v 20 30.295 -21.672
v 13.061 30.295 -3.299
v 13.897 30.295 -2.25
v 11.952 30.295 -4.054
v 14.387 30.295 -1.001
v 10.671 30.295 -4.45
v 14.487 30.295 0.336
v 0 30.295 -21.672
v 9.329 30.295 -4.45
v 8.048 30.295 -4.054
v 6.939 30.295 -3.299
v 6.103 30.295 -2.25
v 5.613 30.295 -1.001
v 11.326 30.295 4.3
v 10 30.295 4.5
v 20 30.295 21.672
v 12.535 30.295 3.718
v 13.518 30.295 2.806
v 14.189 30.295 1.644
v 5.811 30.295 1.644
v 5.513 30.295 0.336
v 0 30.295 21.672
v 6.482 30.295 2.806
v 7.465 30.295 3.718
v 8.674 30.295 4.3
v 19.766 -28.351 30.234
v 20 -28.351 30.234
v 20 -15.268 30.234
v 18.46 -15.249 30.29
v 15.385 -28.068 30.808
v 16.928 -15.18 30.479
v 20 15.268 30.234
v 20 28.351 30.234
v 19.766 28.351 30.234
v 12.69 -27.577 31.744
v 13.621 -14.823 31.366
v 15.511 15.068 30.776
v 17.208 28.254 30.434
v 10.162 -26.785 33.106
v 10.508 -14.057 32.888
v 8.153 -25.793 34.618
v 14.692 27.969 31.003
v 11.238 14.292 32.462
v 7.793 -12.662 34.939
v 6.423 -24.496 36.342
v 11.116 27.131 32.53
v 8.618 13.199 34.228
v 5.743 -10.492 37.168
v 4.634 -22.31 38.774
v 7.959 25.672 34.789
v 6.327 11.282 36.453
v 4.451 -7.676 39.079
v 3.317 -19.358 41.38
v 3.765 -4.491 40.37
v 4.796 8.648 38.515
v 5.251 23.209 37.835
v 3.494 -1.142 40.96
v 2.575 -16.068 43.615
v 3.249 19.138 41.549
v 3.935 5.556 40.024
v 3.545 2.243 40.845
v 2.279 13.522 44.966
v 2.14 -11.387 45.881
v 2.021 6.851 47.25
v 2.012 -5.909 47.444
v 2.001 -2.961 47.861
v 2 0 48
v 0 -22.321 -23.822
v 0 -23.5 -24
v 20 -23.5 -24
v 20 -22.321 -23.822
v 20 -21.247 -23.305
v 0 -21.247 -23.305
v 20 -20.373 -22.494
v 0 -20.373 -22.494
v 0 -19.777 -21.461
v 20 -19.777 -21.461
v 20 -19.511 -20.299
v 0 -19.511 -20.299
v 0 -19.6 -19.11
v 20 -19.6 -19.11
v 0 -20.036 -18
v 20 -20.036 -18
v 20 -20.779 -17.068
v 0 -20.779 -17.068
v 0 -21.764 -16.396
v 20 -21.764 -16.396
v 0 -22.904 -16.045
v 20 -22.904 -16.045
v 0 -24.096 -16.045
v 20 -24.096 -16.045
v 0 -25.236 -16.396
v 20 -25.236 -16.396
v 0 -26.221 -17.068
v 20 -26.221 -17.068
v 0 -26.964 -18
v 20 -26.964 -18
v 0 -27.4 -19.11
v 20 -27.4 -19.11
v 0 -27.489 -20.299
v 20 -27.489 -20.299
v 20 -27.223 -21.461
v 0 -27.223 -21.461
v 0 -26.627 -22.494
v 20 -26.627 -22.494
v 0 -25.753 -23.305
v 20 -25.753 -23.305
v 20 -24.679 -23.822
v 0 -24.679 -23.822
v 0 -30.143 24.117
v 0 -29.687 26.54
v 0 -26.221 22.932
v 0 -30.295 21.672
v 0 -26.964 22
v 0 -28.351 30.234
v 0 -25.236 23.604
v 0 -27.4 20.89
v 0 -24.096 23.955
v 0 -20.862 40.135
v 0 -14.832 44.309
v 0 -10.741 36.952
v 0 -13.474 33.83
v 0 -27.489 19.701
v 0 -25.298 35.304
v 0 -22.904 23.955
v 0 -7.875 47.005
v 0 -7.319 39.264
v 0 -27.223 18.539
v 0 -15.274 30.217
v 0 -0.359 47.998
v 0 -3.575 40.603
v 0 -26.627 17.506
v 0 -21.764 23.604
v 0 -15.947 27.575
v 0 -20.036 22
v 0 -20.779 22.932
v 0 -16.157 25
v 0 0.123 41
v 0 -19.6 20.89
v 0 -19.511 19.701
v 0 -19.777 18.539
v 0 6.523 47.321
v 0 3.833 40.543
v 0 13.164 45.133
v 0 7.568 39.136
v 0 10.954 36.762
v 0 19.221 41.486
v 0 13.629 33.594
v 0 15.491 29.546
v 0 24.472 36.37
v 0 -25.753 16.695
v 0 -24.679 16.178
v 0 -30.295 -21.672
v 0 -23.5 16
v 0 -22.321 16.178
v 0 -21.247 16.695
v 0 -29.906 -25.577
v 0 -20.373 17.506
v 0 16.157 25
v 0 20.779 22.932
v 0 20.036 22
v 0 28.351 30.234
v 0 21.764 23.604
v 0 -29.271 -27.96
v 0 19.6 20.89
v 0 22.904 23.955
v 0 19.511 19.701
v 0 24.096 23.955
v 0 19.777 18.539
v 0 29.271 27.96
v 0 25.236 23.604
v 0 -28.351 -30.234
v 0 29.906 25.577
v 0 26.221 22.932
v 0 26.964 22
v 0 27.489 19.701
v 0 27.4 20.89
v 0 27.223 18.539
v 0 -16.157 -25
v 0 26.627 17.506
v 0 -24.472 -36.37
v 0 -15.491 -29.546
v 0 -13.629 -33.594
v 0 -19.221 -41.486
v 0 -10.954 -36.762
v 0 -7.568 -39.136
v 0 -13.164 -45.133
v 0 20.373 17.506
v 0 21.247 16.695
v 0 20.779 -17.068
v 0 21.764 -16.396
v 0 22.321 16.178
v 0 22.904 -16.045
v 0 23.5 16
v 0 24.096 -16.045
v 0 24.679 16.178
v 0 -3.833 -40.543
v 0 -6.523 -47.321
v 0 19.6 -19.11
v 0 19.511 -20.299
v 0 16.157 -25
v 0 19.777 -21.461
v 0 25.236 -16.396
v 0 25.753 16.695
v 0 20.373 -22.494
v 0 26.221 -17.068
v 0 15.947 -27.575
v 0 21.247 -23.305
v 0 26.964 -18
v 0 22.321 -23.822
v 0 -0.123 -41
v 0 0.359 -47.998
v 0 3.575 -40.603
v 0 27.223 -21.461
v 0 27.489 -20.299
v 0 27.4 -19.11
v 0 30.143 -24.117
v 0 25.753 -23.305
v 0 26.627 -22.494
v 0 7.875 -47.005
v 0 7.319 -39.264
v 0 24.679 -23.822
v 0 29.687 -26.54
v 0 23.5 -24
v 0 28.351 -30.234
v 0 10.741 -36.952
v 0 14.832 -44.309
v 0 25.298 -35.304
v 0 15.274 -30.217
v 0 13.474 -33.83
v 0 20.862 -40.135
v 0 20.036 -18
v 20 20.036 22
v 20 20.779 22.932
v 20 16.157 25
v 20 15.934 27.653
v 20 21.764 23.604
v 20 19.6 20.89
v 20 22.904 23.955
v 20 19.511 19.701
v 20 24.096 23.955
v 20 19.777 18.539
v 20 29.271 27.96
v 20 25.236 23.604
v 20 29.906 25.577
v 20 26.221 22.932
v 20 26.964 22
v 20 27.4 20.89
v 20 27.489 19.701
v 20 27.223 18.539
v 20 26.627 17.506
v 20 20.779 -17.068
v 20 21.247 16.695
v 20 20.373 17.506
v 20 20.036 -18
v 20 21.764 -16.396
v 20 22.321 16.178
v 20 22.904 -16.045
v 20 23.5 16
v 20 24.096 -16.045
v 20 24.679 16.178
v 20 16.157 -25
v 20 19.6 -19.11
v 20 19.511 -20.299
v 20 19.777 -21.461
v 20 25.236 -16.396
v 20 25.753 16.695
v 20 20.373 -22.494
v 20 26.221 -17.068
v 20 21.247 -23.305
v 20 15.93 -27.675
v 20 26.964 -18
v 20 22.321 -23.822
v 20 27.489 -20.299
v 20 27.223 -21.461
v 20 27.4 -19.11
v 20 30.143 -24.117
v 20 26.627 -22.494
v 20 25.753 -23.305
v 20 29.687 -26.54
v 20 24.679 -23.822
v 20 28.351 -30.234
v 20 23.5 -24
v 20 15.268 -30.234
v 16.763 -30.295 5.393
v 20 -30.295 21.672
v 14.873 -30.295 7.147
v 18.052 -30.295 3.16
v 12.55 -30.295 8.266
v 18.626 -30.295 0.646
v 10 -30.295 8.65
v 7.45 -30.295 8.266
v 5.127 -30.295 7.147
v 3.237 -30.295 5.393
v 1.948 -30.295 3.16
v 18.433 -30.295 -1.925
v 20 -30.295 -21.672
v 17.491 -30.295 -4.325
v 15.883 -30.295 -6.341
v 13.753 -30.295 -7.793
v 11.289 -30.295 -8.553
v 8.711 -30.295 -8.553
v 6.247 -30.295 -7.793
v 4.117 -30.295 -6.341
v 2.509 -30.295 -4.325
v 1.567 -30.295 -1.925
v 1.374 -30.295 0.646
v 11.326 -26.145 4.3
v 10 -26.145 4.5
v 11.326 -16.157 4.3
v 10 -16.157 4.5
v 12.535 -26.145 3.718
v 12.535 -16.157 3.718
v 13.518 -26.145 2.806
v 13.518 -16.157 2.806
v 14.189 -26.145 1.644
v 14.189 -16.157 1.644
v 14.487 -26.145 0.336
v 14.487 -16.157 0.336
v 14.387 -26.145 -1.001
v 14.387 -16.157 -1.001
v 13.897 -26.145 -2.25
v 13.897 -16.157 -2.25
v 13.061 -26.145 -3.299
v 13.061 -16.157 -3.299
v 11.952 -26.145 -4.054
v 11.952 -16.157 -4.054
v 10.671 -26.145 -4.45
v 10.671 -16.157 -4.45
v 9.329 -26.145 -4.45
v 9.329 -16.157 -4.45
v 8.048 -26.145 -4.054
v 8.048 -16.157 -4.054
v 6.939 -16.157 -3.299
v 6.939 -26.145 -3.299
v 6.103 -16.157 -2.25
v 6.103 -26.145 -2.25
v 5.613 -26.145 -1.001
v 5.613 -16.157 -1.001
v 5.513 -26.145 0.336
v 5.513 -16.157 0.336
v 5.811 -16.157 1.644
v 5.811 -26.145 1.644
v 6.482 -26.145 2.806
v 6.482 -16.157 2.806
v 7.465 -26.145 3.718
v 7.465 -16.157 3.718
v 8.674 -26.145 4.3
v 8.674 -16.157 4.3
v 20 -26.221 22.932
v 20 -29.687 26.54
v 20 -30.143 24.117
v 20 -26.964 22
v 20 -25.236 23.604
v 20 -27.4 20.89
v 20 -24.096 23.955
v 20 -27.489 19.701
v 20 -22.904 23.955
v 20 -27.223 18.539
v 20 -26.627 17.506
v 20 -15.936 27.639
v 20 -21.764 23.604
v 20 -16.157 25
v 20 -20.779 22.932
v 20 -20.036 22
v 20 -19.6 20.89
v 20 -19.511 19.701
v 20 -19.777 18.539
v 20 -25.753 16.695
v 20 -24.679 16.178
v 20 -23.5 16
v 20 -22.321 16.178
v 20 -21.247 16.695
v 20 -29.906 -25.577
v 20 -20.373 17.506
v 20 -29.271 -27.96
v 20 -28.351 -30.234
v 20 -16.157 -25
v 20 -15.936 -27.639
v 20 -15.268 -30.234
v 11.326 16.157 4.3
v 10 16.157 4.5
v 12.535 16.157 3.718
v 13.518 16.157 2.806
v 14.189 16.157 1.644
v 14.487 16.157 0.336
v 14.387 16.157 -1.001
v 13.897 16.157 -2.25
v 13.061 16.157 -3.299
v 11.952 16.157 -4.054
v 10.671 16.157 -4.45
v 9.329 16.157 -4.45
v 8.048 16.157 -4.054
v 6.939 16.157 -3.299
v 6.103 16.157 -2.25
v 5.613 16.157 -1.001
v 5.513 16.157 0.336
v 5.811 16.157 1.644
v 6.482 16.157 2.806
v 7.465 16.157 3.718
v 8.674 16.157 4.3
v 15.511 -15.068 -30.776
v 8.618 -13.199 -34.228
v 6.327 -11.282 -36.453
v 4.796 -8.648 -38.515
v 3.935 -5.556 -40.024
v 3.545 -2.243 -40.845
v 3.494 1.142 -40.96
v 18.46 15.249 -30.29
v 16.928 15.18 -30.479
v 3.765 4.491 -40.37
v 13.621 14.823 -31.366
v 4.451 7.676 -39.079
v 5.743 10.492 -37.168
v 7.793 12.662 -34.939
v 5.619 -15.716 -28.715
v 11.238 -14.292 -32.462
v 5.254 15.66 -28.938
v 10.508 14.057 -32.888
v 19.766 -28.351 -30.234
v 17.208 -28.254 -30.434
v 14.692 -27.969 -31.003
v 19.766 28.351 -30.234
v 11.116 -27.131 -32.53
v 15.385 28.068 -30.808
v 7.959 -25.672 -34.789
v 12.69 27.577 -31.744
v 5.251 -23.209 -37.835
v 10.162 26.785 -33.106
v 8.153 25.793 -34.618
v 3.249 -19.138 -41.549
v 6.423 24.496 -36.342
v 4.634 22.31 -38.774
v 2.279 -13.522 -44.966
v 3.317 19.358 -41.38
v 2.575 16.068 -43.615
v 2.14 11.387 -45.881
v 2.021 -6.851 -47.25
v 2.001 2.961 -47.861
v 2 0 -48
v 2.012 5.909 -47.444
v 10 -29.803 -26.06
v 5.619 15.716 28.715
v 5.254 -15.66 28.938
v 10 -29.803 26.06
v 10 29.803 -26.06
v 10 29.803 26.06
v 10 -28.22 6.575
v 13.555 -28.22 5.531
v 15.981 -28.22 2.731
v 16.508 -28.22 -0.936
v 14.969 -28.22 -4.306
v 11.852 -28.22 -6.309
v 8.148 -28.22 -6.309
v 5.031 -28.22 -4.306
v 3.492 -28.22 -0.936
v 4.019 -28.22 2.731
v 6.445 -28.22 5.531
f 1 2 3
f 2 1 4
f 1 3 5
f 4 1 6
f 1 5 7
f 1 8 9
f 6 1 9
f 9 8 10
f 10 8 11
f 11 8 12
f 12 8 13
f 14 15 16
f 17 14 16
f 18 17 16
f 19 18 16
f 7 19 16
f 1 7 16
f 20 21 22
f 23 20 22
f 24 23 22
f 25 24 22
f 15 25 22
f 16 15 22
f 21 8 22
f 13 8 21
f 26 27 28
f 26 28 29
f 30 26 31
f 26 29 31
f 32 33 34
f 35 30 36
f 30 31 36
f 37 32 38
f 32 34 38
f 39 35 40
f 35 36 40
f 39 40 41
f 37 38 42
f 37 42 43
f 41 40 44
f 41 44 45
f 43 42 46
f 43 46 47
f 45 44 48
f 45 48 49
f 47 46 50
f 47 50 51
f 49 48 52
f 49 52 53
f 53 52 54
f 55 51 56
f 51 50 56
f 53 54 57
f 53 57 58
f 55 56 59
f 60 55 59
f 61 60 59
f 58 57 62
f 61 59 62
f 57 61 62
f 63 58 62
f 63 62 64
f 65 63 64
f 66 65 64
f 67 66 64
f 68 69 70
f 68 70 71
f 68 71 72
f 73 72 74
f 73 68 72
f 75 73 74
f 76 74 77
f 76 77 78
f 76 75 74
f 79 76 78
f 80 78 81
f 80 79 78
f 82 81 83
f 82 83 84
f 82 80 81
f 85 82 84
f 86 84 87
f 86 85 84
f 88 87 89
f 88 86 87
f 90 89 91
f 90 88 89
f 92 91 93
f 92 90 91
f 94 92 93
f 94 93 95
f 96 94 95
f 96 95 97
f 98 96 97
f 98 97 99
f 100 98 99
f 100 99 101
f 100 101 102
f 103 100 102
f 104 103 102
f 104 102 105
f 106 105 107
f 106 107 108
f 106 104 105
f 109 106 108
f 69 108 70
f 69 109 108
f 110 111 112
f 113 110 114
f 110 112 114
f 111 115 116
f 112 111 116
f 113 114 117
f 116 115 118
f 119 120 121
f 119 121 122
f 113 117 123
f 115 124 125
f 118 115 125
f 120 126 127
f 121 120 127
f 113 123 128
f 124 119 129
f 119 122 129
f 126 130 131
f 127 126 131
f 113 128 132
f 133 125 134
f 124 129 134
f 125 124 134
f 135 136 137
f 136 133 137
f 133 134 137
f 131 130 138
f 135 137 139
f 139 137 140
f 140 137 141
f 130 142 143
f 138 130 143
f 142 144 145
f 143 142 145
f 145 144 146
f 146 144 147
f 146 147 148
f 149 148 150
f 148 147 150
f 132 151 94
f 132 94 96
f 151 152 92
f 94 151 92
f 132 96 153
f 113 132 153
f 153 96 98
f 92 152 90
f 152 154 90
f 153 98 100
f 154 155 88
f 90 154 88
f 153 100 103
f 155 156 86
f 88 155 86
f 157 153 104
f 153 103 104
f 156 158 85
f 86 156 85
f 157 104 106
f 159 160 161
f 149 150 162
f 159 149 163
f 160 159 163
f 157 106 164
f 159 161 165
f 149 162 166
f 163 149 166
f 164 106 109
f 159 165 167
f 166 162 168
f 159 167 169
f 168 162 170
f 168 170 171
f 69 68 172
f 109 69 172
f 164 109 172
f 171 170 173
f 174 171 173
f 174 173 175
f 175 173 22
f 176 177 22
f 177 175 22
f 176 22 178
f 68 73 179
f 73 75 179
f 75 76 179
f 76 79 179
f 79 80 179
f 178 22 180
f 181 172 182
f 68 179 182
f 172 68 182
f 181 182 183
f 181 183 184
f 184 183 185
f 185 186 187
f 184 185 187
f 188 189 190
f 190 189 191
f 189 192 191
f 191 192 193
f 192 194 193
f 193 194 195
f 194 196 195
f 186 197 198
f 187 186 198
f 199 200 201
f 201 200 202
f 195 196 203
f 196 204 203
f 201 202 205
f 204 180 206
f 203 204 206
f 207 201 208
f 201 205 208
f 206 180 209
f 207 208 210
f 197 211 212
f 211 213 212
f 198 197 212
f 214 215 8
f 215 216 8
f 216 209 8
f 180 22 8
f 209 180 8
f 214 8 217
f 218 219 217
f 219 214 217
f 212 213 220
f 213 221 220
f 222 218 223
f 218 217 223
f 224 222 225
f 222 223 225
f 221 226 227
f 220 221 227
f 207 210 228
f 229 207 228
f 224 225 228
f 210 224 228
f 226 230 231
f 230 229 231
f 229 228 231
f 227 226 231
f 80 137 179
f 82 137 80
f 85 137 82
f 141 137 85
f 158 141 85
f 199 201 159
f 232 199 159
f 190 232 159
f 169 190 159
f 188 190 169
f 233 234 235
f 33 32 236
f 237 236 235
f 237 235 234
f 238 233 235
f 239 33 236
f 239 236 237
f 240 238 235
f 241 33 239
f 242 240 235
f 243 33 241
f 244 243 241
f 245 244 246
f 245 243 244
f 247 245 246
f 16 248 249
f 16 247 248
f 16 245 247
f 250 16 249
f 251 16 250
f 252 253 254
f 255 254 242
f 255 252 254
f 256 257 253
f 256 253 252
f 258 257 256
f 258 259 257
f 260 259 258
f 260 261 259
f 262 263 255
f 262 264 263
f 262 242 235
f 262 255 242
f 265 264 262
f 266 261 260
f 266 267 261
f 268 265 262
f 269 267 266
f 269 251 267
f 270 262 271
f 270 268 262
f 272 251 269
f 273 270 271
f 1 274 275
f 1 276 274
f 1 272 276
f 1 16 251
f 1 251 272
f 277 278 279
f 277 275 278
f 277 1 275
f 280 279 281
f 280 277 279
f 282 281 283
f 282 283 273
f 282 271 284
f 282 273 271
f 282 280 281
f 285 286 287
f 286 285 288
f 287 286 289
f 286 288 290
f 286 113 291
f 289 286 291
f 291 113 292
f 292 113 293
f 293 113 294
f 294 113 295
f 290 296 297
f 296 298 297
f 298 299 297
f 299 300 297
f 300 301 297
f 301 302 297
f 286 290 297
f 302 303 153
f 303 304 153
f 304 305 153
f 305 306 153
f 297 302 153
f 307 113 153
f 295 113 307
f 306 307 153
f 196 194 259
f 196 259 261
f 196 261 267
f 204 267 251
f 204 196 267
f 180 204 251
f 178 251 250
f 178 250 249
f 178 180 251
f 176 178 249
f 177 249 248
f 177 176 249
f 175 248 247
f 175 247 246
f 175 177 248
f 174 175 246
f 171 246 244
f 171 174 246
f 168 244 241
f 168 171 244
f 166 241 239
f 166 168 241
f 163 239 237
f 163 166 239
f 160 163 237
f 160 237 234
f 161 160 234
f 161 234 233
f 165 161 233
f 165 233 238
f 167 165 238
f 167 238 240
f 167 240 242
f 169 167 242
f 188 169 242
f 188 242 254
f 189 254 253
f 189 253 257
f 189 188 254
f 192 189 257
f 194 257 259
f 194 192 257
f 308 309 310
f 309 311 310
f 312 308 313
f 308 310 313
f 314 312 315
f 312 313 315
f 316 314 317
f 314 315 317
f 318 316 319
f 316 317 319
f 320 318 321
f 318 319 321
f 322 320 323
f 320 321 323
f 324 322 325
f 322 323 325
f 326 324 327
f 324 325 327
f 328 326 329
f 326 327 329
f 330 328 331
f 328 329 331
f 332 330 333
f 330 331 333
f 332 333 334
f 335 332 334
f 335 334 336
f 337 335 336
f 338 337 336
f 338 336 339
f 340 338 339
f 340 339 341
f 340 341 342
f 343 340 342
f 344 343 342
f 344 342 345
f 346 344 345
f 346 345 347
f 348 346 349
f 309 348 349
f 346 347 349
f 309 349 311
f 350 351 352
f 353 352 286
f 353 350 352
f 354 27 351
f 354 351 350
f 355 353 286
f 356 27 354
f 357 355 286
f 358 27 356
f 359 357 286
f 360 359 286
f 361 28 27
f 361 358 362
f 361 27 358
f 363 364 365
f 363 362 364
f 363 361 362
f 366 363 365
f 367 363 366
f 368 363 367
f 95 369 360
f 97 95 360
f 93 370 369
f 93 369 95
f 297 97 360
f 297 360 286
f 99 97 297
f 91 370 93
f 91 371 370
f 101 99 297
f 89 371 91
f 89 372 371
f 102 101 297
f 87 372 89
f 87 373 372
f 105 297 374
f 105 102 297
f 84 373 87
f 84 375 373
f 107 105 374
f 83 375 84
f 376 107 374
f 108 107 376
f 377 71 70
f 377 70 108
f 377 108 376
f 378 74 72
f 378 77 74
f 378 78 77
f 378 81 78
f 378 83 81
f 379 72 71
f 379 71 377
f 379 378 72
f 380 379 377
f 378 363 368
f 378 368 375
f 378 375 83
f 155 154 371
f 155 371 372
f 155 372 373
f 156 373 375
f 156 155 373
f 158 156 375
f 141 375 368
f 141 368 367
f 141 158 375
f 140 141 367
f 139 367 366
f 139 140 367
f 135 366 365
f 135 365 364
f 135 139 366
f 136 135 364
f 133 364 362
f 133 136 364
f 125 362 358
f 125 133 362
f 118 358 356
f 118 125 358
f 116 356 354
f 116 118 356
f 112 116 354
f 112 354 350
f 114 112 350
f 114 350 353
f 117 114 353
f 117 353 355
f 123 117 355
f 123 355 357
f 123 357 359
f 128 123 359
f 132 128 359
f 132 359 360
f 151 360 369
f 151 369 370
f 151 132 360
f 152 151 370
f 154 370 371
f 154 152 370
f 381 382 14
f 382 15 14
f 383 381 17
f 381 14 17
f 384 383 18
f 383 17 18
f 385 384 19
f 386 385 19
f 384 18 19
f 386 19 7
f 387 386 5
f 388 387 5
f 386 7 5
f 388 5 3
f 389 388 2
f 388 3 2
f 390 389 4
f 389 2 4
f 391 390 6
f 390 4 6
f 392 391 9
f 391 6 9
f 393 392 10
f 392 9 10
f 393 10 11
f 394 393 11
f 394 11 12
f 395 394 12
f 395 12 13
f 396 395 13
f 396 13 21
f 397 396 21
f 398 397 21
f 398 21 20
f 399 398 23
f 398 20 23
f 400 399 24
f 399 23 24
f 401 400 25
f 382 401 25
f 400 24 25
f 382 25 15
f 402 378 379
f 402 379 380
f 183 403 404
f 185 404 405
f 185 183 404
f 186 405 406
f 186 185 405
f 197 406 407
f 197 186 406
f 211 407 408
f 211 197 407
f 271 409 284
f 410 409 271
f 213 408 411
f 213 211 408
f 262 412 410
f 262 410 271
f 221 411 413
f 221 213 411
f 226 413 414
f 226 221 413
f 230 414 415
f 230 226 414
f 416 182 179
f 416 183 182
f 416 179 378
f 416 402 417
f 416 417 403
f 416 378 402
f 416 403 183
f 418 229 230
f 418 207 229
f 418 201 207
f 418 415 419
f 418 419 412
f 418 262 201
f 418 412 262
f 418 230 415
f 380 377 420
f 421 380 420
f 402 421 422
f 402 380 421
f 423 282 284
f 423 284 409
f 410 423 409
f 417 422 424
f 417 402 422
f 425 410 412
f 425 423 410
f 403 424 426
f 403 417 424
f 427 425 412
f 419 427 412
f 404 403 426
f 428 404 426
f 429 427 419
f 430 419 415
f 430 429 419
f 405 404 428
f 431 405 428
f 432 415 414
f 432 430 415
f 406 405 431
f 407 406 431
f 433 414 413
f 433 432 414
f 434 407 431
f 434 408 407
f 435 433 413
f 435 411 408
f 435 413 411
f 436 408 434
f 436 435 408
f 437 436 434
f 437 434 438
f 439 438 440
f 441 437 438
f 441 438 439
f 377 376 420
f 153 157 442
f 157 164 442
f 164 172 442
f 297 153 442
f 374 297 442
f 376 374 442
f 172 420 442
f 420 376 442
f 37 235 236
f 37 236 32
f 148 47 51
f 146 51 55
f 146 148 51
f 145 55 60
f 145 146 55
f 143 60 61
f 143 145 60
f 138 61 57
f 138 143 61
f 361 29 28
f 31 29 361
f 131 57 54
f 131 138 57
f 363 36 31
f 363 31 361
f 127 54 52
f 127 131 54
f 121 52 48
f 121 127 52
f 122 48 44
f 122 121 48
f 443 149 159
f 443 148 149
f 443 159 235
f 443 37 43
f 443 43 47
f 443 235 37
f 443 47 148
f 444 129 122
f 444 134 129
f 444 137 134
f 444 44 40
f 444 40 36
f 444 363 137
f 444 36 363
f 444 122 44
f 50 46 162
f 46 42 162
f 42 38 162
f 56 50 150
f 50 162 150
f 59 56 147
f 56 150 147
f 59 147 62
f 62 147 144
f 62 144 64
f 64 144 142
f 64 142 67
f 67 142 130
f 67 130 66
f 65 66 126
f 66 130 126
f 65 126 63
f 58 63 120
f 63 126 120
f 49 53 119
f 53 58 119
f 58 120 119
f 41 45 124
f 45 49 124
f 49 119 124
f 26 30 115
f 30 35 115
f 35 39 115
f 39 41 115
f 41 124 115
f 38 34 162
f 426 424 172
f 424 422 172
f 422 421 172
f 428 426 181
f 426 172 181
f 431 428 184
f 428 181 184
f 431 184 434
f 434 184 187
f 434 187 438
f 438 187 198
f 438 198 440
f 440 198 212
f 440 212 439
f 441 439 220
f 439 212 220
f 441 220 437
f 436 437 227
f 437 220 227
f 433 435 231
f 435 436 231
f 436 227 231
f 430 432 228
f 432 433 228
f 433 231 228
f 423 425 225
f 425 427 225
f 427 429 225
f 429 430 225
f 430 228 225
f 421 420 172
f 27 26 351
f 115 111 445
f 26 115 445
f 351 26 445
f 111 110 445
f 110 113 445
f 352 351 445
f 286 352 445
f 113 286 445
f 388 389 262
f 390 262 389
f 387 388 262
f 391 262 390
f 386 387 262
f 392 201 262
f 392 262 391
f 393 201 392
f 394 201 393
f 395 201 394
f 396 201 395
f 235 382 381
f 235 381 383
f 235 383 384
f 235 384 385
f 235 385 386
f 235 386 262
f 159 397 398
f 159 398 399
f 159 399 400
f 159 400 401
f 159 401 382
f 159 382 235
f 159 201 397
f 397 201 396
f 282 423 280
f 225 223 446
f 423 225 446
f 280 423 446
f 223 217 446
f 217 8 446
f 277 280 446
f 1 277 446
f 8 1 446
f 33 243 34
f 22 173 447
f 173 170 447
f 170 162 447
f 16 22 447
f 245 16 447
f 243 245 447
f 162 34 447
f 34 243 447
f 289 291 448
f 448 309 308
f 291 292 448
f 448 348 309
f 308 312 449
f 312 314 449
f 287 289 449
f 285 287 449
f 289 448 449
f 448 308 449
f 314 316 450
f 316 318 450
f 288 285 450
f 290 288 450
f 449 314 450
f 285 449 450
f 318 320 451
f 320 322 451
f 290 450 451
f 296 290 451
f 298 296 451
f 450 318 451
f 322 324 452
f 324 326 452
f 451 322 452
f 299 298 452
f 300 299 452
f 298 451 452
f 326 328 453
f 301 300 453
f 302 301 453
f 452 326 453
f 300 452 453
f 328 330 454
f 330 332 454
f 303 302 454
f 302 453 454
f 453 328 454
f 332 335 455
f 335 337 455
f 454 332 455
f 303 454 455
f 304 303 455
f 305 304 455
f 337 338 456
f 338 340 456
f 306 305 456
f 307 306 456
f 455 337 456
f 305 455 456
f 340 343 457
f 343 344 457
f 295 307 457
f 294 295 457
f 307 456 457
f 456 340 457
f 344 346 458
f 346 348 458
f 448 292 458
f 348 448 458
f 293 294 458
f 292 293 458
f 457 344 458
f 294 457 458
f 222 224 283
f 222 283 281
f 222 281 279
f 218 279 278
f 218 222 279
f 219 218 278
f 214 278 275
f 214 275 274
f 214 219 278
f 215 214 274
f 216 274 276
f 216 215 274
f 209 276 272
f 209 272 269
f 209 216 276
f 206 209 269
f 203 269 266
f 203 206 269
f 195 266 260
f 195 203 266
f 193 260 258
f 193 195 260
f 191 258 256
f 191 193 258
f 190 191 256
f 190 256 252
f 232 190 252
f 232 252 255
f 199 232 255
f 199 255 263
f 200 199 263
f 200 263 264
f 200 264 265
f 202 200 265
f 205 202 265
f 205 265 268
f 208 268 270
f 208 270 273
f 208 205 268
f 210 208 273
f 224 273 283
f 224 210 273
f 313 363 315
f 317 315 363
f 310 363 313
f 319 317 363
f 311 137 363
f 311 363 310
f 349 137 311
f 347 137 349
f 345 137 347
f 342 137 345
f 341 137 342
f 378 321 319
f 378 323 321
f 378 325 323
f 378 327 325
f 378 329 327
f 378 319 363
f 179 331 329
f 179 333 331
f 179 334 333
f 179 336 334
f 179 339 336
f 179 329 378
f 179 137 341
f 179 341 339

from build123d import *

# Parameters (mm, degrees)
SZKIC1_R                                         = 4
DODANIE_WYCI_GNI_CIE1_DEPTH                      = 20
WYTNIJ_WYCI_GNI_CIE4_DEPTH                       = 80.844262412
WYTNIJ_WYCI_GNI_CIE4_DEPTH_BACK                  = 80.844262412
POG_BIENIE_STO_KOWE_POD_M8_RUB_Z_BEM_D           = 9
POG_BIENIE_STO_KOWE_POD_M8_RUB_Z_BEM_CSINK_D     = 17.3
POG_BIENIE_STO_KOWE_POD_M8_RUB_Z_BEM_CSINK_ANGLE = 90


with BuildPart() as part:
    # Szkic1 → Dodanie-wyciągnięcie1 (new body)
    with BuildSketch(Plane(origin=(0, 0, 0), x_dir=(0, 0, -1), z_dir=(1, 0, 0))):
        with BuildLine():
            add(Edge.make_bspline(
                [(-21.671768561, 30.294827176), (-26.169216525, 30.294827176), (-30.233707808, 28.350561908)],
                knots=[3.141592654, 3.141592654, 3.141592654, 3.583978625, 3.583978625, 3.583978625], degree=2, weights=[1, 0.97563641, 1]))
            add(Edge.make_bspline(
                [(-30.233707808, 28.350561908), (-89.500626622, 0), (-30.233707808, -28.350561908)],
                knots=[3.583978625, 3.583978625, 3.583978625, 5.840799336, 5.840799336, 5.840799336], degree=2, weights=[1, 0.428096962, 1]))
            add(Edge.make_bspline(
                [(-30.233707808, -28.350561908), (-26.169216525, -30.294827176), (-21.671768561, -30.294827176)],
                knots=[2.699206682, 2.699206682, 2.699206682, 3.141592654, 3.141592654, 3.141592654], degree=2, weights=[1, 0.97563641, 1]))
            Line((-21.671768561, -30.294827176), (21.671768561, -30.294827176))
            add(Edge.make_bspline(
                [(21.671768561, -30.294827176), (26.169216525, -30.294827176), (30.233707808, -28.350561908)],
                knots=[0, 0, 0, 0.442385972, 0.442385972, 0.442385972], degree=2, weights=[1, 0.97563641, 1]))
            add(Edge.make_bspline(
                [(30.233707808, -28.350561908), (89.500626622, 0), (30.233707808, 28.350561908)],
                knots=[0.442385972, 0.442385972, 0.442385972, 2.699206682, 2.699206682, 2.699206682], degree=2, weights=[1, 0.428096962, 1]))
            add(Edge.make_bspline(
                [(30.233707808, 28.350561908), (26.169216525, 30.294827176), (21.671768561, 30.294827176)],
                knots=[2.699206682, 2.699206682, 2.699206682, 3.141592654, 3.141592654, 3.141592654], degree=2, weights=[1, 0.97563641, 1]))
            Line((21.671768561, 30.294827176), (-21.671768561, 30.294827176))
        make_face()
        with Locations((-20, 23.5)):
            Circle(SZKIC1_R, mode=Mode.SUBTRACT)
        with Locations((20, 23.5)):
            Circle(SZKIC1_R, mode=Mode.SUBTRACT)
        with Locations((-20, -23.5)):
            Circle(SZKIC1_R, mode=Mode.SUBTRACT)
        with Locations((20, -23.5)):
            Circle(SZKIC1_R, mode=Mode.SUBTRACT)
        with BuildLine():
            add(Edge.make_bspline(
                [(25, -16.15724116), (41, -16.15724116), (41, 0), (41, 16.15724116), (25, 16.15724116)],
                knots=[3.141592654, 3.141592654, 3.141592654, 4.71238898, 4.71238898, 6.283185307, 6.283185307, 6.283185307], degree=2, weights=[1, 0.707106781, 1, 0.707106781, 1]))
            Line((25, 16.15724116), (-25, 16.15724116))
            add(Edge.make_bspline(
                [(-25, 16.15724116), (-41, 16.15724116), (-41, 0), (-41, -16.15724116), (-25, -16.15724116)],
                knots=[0, 0, 0, 1.570796327, 1.570796327, 3.141592654, 3.141592654, 3.141592654], degree=2, weights=[1, 0.707106781, 1, 0.707106781, 1]))
            Line((-25, -16.15724116), (25, -16.15724116))
        make_face(mode=Mode.SUBTRACT)
    extrude(amount=DODANIE_WYCI_GNI_CIE1_DEPTH)

    # Szkic2 → Wytnij-wyciągnięcie4 (cut, two sides: drawn at the far end of the back side and taken through both)
    with BuildSketch(Plane.XZ.offset(30.294827176).offset(-WYTNIJ_WYCI_GNI_CIE4_DEPTH_BACK)):
        with BuildLine():
            Line((2, 48), (2, 49.871745004))
            Line((2, 49.871745004), (22.127967947, 49.871745004))
            Line((22.127967947, 49.871745004), (22.127967947, 30.233707808))
            Line((22.127967947, 30.233707808), (20, 30.233707808))
            ThreePointArc((20, 30.233707808), (7.320480411, 35.388931843), (2, 48))
        make_face()
        with BuildLine():
            Line((22.127967947, -30.233707808), (20, -30.233707808))
            ThreePointArc((20, -30.233707808), (7.320480411, -35.388931843), (2, -48))
            Line((2, -48), (2, -49.871745004))
            Line((2, -49.871745004), (22.127967947, -49.871745004))
            Line((22.127967947, -49.871745004), (22.127967947, -30.233707808))
        make_face()
    extrude(amount=WYTNIJ_WYCI_GNI_CIE4_DEPTH + WYTNIJ_WYCI_GNI_CIE4_DEPTH_BACK, mode=Mode.SUBTRACT)

    # Pogłębienie stożkowe pod M8 Śrubę z łbem soczewkowym1 (through all)
    with Locations(Plane(origin=(10, -30.294827176, 0), x_dir=(0, 0, -1), z_dir=(0, -1, 0))):
        with Locations((0, 0)):
            CounterSinkHole(POG_BIENIE_STO_KOWE_POD_M8_RUB_Z_BEM_D / 2, POG_BIENIE_STO_KOWE_POD_M8_RUB_Z_BEM_CSINK_D / 2, counter_sink_angle=POG_BIENIE_STO_KOWE_POD_M8_RUB_Z_BEM_CSINK_ANGLE)


solid = part.part
